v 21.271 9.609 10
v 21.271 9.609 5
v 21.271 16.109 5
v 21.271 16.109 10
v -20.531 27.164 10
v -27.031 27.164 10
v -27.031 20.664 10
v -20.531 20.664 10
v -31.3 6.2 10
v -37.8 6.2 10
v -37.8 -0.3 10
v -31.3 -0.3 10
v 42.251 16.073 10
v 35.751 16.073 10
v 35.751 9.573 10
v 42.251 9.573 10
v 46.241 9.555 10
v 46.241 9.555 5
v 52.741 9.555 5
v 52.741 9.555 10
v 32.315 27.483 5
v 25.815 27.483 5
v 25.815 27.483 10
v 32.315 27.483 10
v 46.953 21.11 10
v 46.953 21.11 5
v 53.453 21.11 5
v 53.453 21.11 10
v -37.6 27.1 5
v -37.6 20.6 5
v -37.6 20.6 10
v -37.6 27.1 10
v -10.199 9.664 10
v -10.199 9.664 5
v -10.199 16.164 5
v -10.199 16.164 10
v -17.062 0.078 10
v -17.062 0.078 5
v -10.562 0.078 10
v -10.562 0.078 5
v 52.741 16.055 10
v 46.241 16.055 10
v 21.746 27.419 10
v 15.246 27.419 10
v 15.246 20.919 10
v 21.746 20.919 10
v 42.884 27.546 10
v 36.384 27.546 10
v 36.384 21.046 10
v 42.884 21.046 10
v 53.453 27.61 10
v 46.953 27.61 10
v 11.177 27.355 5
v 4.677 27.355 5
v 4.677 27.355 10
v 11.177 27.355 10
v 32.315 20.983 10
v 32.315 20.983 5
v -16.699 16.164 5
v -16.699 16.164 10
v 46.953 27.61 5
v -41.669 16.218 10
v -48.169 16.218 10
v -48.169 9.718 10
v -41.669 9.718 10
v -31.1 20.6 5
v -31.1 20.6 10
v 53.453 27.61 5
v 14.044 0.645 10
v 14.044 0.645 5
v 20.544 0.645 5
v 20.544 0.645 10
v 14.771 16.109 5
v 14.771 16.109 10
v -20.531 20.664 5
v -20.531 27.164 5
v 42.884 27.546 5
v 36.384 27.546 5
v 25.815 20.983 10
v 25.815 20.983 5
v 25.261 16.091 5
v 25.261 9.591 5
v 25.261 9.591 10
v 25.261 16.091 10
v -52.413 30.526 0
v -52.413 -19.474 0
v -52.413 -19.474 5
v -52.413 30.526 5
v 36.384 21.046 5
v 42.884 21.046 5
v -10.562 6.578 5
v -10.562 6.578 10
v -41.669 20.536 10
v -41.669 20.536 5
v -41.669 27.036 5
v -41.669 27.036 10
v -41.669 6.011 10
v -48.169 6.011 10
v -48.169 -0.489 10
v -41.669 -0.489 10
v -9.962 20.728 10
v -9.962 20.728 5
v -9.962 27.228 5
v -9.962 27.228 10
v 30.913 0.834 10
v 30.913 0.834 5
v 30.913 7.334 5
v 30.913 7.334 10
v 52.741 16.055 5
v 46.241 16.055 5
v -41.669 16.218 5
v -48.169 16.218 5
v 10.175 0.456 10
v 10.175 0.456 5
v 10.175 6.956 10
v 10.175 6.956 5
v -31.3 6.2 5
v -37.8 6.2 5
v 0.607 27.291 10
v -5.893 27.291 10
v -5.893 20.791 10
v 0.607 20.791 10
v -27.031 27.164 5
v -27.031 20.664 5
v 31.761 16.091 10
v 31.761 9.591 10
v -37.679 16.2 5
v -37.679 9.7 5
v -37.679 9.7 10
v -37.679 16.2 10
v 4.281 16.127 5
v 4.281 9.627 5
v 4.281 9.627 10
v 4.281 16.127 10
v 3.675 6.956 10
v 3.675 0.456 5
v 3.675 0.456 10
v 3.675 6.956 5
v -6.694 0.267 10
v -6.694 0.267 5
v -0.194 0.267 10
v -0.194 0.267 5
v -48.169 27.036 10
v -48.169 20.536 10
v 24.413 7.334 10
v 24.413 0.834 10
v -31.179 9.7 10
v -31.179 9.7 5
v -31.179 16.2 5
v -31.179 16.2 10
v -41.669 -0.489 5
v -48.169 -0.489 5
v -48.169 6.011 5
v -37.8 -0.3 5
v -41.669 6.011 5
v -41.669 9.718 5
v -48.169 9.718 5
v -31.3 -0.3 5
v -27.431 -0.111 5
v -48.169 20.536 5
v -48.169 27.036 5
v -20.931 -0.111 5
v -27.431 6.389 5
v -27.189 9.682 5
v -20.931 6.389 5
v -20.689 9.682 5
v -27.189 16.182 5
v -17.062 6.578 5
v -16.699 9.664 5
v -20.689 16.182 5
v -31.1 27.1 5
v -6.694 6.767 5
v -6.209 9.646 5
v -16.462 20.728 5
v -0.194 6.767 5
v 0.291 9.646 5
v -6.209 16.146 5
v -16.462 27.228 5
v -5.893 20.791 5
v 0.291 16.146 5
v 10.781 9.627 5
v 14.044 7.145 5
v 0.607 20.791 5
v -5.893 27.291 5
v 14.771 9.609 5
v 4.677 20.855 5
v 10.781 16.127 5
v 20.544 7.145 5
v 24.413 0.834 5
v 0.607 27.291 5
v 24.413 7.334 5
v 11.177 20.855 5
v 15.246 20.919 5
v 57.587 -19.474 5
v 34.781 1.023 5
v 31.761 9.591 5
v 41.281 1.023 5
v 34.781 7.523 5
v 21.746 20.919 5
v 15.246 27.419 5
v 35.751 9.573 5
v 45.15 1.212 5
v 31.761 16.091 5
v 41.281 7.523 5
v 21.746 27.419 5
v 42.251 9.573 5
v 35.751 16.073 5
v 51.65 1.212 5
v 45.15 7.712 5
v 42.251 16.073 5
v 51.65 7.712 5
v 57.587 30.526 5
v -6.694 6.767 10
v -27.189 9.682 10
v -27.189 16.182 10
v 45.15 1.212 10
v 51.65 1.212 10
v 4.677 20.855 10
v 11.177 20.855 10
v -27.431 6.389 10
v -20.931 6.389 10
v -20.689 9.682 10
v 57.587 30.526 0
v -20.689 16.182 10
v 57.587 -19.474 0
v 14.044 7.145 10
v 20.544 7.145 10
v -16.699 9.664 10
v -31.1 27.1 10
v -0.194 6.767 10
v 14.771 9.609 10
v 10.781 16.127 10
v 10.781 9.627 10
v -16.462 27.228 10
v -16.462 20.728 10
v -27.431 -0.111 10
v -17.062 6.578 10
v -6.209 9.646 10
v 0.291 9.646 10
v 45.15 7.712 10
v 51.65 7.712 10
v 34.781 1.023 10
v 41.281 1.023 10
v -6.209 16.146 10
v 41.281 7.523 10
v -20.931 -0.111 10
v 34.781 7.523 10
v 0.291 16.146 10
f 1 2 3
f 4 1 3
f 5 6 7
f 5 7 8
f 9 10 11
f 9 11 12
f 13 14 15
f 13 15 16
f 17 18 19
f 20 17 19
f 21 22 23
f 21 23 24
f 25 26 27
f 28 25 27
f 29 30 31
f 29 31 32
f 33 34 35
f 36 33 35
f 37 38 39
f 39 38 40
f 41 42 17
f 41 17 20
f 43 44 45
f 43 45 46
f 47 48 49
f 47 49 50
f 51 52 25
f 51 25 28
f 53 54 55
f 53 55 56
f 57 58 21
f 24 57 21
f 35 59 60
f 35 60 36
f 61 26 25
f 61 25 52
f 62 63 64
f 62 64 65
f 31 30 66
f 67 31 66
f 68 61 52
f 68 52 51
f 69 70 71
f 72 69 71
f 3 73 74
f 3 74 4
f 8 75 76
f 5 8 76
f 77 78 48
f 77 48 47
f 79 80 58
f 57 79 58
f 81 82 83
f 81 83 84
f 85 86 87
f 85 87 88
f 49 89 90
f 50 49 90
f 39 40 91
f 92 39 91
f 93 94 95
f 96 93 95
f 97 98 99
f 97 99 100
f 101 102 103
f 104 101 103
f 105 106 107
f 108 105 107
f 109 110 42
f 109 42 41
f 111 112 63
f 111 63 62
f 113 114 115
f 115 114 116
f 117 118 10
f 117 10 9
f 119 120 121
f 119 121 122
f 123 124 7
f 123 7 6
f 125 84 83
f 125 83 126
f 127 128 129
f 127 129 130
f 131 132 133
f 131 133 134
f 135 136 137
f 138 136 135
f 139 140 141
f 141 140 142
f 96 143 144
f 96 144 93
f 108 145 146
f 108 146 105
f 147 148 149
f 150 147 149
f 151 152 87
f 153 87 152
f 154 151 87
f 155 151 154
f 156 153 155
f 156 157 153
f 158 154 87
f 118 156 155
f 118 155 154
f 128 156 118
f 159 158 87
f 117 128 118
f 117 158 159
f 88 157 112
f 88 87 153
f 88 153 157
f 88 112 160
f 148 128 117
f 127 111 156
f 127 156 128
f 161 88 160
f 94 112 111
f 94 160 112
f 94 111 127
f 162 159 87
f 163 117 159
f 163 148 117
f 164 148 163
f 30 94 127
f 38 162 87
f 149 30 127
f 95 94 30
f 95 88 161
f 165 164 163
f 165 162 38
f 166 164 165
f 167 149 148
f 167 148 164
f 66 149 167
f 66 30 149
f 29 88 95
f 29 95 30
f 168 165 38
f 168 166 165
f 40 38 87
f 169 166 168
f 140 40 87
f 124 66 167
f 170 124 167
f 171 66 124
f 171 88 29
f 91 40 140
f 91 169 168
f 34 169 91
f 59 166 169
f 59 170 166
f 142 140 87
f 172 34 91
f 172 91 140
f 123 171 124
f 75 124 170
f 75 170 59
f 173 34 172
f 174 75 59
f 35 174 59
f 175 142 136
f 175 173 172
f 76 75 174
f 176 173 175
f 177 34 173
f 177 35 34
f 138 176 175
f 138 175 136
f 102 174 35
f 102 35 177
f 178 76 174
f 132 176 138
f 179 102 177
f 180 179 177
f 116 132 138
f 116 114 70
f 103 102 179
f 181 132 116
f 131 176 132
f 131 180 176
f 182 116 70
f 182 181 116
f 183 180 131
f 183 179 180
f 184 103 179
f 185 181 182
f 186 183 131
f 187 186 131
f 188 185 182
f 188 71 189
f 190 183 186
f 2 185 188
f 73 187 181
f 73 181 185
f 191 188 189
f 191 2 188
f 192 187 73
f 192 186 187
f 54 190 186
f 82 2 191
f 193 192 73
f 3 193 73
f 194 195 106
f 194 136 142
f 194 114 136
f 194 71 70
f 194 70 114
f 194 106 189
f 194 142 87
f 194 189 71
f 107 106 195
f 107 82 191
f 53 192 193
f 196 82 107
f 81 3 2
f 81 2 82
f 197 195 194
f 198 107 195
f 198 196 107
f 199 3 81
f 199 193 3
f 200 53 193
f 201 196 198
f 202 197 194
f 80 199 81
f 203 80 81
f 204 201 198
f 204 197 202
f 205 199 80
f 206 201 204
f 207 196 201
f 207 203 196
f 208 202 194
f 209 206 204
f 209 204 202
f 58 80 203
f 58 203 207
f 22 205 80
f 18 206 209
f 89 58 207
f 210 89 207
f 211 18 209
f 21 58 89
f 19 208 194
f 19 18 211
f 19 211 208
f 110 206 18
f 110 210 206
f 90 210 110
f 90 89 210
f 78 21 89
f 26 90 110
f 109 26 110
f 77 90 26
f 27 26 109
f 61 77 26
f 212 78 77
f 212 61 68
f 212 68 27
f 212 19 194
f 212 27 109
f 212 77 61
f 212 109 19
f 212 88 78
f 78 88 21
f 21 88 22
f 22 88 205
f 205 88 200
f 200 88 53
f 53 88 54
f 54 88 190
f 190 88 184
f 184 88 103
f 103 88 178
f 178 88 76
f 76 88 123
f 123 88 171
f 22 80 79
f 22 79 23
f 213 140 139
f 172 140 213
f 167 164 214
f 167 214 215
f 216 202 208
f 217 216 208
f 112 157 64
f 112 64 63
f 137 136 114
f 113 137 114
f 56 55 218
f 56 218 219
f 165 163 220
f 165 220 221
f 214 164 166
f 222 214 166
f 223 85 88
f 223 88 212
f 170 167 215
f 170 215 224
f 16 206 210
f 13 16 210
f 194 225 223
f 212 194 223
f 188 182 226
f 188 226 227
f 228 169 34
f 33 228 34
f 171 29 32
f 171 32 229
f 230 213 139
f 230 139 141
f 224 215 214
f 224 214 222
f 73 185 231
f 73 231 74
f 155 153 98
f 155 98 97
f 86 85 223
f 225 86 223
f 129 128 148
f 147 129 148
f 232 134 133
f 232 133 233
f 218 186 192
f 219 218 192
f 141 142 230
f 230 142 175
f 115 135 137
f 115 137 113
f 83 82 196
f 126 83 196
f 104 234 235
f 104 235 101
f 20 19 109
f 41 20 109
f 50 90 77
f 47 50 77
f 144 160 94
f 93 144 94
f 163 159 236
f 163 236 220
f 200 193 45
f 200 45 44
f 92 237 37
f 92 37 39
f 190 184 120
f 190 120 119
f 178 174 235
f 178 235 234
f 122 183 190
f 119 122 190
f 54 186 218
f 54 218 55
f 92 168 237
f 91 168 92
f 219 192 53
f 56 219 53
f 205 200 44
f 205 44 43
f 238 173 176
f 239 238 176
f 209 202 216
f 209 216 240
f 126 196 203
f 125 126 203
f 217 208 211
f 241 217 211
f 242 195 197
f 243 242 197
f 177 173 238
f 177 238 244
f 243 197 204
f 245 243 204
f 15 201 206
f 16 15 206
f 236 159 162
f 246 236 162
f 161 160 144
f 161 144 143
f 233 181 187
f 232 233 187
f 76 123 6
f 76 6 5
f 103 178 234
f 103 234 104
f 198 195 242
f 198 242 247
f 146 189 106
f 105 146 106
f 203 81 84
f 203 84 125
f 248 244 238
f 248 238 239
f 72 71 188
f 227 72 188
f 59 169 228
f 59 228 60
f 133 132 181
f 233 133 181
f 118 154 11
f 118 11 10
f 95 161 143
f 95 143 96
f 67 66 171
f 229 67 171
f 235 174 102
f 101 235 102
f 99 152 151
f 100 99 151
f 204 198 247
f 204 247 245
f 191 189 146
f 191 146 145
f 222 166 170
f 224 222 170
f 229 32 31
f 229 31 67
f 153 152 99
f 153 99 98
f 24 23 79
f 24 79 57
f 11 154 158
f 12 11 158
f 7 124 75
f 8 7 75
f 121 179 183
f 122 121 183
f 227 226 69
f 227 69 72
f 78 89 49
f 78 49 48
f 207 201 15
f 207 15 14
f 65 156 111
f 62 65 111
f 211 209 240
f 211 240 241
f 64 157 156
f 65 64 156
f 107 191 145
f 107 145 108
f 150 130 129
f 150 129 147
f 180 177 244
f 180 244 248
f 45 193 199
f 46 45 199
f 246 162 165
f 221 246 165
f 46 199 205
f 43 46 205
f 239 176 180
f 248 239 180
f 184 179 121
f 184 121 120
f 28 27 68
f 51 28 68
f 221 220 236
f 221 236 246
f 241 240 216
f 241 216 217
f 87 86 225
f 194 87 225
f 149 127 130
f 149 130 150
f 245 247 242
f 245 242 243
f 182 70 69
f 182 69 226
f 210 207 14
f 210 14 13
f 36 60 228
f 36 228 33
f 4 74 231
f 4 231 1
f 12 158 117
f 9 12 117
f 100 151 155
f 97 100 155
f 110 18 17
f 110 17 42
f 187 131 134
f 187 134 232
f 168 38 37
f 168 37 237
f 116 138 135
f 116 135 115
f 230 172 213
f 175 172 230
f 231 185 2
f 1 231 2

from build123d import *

# Parameters (mm, degrees)
F0_W     = 110
F0_H     = 50
F1_DEPTH = 5
F2_W     = 6.5
F2_H     = 6.5
F3_DEPTH = 5


with BuildPart() as f1:
    # F0 (on Top) → F1 (new body)
    with BuildSketch(Plane.XY):
        with Locations((2.586676, 5.525514)):
            Rectangle(F0_W, F0_H)
    extrude(amount=F1_DEPTH)

    # F2 (on face) → F3 (join)
    with BuildSketch(Plane.XY.offset(5)):
        with Locations((-44.919127, 23.786242)):
            Rectangle(F2_W, F2_H)
        with Locations((-34.35, 23.85)):
            Rectangle(F2_W, F2_H)
        with Locations((-23.780873, 23.913758)):
            Rectangle(F2_W, F2_H)
        with Locations((-13.211747, 23.977516)):
            Rectangle(F2_W, F2_H)
        with Locations((-2.64262, 24.041274)):
            Rectangle(F2_W, F2_H)
        with Locations((7.926506, 24.105032)):
            Rectangle(F2_W, F2_H)
        with Locations((18.495633, 24.16879)):
            Rectangle(F2_W, F2_H)
        with Locations((29.06476, 24.232548)):
            Rectangle(F2_W, F2_H)
        with Locations((39.633886, 24.296306)):
            Rectangle(F2_W, F2_H)
        with Locations((50.203013, 24.360064)):
            Rectangle(F2_W, F2_H)
        with Locations((-44.918754, 12.968144)):
            Rectangle(F2_W, F2_H)
        with Locations((-34.428743, 12.95)):
            Rectangle(F2_W, F2_H)
        with Locations((-23.938732, 12.931856)):
            Rectangle(F2_W, F2_H)
        with Locations((-13.44872, 12.913711)):
            Rectangle(F2_W, F2_H)
        with Locations((-2.958709, 12.895567)):
            Rectangle(F2_W, F2_H)
        with Locations((7.531302, 12.877423)):
            Rectangle(F2_W, F2_H)
        with Locations((18.021314, 12.859278)):
            Rectangle(F2_W, F2_H)
        with Locations((28.511325, 12.841134)):
            Rectangle(F2_W, F2_H)
        with Locations((39.001336, 12.82299)):
            Rectangle(F2_W, F2_H)
        with Locations((49.491347, 12.804845)):
            Rectangle(F2_W, F2_H)
        with Locations((-44.918754, 2.76096)):
            Rectangle(F2_W, F2_H)
        with Locations((-34.55, 2.95)):
            Rectangle(F2_W, F2_H)
        with Locations((-24.181246, 3.13904)):
            Rectangle(F2_W, F2_H)
        with Locations((-13.812492, 3.32808)):
            Rectangle(F2_W, F2_H)
        with Locations((-3.443738, 3.51712)):
            Rectangle(F2_W, F2_H)
        with Locations((6.925016, 3.70616)):
            Rectangle(F2_W, F2_H)
        with Locations((17.29377, 3.8952)):
            Rectangle(F2_W, F2_H)
        with Locations((27.662524, 4.08424)):
            Rectangle(F2_W, F2_H)
        with Locations((38.031278, 4.27328)):
            Rectangle(F2_W, F2_H)
        with Locations((48.400033, 4.462319)):
            Rectangle(F2_W, F2_H)
    extrude(amount=F3_DEPTH)


solid = f1.part
